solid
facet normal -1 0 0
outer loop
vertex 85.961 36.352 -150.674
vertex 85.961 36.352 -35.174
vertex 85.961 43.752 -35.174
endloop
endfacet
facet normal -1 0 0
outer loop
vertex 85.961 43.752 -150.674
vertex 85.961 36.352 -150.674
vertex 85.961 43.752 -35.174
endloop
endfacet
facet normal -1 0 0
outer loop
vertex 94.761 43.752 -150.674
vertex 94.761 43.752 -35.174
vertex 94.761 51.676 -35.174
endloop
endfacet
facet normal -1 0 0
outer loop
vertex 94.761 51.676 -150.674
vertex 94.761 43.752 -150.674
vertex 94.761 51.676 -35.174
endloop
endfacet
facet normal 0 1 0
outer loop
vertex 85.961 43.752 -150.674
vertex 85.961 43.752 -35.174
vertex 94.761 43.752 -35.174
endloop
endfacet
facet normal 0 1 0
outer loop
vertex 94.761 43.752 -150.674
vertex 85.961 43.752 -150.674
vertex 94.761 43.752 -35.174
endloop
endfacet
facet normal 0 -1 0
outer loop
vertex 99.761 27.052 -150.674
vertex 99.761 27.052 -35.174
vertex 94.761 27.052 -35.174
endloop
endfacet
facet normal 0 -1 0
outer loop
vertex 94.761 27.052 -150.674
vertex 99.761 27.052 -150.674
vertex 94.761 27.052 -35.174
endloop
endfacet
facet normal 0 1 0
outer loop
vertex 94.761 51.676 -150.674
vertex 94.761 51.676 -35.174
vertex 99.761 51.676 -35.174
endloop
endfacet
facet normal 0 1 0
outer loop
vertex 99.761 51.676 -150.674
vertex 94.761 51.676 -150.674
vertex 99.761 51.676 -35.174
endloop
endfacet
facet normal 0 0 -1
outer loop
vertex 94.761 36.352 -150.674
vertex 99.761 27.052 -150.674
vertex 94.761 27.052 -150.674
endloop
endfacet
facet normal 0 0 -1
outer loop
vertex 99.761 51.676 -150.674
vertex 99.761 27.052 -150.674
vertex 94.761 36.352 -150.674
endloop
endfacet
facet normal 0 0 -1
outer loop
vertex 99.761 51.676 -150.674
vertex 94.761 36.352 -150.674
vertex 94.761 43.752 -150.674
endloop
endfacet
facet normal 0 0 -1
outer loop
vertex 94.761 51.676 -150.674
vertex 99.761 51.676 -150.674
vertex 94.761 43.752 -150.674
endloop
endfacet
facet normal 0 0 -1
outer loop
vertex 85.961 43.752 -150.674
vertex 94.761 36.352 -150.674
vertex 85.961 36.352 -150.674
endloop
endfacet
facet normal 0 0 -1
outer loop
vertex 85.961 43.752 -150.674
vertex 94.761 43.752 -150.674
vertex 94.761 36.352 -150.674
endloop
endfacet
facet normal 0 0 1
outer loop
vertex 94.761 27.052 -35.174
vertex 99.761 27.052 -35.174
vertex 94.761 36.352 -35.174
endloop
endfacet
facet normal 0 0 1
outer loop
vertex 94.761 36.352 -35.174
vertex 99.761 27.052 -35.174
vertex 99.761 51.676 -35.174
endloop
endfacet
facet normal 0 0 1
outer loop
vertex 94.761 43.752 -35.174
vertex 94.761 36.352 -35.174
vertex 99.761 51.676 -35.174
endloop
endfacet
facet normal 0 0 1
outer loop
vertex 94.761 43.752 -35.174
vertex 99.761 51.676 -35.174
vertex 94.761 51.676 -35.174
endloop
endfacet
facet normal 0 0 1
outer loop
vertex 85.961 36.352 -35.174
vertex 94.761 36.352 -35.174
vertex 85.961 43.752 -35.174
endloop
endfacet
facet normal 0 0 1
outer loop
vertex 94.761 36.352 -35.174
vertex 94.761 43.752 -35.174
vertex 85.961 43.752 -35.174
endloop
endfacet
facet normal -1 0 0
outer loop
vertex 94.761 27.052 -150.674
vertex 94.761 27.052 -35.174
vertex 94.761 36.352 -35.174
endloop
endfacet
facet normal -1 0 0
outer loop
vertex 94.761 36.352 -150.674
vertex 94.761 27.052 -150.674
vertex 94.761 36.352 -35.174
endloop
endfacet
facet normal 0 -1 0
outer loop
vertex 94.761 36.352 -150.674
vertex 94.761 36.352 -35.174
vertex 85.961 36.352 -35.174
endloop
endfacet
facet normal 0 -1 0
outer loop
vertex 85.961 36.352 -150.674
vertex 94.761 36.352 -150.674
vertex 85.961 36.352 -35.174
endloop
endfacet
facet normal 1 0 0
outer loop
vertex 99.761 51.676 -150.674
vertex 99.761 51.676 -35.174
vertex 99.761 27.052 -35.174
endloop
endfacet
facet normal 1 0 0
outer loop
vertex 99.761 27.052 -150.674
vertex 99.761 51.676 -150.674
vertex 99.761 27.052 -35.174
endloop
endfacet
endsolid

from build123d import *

# Parameters (mm, degrees)
EXTRUDE2_DEPTH = 115.5


with BuildPart() as part:
    # Sketch1 → Extrude2 (new body)
    with BuildSketch(Plane.XY.offset(-35.173777659)):
        Polygon((85.961408719, 43.751957214), (94.761408719, 43.751957214), (94.761408719, 51.676244301), (99.761408719, 51.676244301), (99.761408719, 27.051957214), (94.761408719, 27.051957214), (94.761408719, 36.351957214), (85.961408719, 36.351957214), align=None)
    extrude(amount=-EXTRUDE2_DEPTH)


solid = part.part
